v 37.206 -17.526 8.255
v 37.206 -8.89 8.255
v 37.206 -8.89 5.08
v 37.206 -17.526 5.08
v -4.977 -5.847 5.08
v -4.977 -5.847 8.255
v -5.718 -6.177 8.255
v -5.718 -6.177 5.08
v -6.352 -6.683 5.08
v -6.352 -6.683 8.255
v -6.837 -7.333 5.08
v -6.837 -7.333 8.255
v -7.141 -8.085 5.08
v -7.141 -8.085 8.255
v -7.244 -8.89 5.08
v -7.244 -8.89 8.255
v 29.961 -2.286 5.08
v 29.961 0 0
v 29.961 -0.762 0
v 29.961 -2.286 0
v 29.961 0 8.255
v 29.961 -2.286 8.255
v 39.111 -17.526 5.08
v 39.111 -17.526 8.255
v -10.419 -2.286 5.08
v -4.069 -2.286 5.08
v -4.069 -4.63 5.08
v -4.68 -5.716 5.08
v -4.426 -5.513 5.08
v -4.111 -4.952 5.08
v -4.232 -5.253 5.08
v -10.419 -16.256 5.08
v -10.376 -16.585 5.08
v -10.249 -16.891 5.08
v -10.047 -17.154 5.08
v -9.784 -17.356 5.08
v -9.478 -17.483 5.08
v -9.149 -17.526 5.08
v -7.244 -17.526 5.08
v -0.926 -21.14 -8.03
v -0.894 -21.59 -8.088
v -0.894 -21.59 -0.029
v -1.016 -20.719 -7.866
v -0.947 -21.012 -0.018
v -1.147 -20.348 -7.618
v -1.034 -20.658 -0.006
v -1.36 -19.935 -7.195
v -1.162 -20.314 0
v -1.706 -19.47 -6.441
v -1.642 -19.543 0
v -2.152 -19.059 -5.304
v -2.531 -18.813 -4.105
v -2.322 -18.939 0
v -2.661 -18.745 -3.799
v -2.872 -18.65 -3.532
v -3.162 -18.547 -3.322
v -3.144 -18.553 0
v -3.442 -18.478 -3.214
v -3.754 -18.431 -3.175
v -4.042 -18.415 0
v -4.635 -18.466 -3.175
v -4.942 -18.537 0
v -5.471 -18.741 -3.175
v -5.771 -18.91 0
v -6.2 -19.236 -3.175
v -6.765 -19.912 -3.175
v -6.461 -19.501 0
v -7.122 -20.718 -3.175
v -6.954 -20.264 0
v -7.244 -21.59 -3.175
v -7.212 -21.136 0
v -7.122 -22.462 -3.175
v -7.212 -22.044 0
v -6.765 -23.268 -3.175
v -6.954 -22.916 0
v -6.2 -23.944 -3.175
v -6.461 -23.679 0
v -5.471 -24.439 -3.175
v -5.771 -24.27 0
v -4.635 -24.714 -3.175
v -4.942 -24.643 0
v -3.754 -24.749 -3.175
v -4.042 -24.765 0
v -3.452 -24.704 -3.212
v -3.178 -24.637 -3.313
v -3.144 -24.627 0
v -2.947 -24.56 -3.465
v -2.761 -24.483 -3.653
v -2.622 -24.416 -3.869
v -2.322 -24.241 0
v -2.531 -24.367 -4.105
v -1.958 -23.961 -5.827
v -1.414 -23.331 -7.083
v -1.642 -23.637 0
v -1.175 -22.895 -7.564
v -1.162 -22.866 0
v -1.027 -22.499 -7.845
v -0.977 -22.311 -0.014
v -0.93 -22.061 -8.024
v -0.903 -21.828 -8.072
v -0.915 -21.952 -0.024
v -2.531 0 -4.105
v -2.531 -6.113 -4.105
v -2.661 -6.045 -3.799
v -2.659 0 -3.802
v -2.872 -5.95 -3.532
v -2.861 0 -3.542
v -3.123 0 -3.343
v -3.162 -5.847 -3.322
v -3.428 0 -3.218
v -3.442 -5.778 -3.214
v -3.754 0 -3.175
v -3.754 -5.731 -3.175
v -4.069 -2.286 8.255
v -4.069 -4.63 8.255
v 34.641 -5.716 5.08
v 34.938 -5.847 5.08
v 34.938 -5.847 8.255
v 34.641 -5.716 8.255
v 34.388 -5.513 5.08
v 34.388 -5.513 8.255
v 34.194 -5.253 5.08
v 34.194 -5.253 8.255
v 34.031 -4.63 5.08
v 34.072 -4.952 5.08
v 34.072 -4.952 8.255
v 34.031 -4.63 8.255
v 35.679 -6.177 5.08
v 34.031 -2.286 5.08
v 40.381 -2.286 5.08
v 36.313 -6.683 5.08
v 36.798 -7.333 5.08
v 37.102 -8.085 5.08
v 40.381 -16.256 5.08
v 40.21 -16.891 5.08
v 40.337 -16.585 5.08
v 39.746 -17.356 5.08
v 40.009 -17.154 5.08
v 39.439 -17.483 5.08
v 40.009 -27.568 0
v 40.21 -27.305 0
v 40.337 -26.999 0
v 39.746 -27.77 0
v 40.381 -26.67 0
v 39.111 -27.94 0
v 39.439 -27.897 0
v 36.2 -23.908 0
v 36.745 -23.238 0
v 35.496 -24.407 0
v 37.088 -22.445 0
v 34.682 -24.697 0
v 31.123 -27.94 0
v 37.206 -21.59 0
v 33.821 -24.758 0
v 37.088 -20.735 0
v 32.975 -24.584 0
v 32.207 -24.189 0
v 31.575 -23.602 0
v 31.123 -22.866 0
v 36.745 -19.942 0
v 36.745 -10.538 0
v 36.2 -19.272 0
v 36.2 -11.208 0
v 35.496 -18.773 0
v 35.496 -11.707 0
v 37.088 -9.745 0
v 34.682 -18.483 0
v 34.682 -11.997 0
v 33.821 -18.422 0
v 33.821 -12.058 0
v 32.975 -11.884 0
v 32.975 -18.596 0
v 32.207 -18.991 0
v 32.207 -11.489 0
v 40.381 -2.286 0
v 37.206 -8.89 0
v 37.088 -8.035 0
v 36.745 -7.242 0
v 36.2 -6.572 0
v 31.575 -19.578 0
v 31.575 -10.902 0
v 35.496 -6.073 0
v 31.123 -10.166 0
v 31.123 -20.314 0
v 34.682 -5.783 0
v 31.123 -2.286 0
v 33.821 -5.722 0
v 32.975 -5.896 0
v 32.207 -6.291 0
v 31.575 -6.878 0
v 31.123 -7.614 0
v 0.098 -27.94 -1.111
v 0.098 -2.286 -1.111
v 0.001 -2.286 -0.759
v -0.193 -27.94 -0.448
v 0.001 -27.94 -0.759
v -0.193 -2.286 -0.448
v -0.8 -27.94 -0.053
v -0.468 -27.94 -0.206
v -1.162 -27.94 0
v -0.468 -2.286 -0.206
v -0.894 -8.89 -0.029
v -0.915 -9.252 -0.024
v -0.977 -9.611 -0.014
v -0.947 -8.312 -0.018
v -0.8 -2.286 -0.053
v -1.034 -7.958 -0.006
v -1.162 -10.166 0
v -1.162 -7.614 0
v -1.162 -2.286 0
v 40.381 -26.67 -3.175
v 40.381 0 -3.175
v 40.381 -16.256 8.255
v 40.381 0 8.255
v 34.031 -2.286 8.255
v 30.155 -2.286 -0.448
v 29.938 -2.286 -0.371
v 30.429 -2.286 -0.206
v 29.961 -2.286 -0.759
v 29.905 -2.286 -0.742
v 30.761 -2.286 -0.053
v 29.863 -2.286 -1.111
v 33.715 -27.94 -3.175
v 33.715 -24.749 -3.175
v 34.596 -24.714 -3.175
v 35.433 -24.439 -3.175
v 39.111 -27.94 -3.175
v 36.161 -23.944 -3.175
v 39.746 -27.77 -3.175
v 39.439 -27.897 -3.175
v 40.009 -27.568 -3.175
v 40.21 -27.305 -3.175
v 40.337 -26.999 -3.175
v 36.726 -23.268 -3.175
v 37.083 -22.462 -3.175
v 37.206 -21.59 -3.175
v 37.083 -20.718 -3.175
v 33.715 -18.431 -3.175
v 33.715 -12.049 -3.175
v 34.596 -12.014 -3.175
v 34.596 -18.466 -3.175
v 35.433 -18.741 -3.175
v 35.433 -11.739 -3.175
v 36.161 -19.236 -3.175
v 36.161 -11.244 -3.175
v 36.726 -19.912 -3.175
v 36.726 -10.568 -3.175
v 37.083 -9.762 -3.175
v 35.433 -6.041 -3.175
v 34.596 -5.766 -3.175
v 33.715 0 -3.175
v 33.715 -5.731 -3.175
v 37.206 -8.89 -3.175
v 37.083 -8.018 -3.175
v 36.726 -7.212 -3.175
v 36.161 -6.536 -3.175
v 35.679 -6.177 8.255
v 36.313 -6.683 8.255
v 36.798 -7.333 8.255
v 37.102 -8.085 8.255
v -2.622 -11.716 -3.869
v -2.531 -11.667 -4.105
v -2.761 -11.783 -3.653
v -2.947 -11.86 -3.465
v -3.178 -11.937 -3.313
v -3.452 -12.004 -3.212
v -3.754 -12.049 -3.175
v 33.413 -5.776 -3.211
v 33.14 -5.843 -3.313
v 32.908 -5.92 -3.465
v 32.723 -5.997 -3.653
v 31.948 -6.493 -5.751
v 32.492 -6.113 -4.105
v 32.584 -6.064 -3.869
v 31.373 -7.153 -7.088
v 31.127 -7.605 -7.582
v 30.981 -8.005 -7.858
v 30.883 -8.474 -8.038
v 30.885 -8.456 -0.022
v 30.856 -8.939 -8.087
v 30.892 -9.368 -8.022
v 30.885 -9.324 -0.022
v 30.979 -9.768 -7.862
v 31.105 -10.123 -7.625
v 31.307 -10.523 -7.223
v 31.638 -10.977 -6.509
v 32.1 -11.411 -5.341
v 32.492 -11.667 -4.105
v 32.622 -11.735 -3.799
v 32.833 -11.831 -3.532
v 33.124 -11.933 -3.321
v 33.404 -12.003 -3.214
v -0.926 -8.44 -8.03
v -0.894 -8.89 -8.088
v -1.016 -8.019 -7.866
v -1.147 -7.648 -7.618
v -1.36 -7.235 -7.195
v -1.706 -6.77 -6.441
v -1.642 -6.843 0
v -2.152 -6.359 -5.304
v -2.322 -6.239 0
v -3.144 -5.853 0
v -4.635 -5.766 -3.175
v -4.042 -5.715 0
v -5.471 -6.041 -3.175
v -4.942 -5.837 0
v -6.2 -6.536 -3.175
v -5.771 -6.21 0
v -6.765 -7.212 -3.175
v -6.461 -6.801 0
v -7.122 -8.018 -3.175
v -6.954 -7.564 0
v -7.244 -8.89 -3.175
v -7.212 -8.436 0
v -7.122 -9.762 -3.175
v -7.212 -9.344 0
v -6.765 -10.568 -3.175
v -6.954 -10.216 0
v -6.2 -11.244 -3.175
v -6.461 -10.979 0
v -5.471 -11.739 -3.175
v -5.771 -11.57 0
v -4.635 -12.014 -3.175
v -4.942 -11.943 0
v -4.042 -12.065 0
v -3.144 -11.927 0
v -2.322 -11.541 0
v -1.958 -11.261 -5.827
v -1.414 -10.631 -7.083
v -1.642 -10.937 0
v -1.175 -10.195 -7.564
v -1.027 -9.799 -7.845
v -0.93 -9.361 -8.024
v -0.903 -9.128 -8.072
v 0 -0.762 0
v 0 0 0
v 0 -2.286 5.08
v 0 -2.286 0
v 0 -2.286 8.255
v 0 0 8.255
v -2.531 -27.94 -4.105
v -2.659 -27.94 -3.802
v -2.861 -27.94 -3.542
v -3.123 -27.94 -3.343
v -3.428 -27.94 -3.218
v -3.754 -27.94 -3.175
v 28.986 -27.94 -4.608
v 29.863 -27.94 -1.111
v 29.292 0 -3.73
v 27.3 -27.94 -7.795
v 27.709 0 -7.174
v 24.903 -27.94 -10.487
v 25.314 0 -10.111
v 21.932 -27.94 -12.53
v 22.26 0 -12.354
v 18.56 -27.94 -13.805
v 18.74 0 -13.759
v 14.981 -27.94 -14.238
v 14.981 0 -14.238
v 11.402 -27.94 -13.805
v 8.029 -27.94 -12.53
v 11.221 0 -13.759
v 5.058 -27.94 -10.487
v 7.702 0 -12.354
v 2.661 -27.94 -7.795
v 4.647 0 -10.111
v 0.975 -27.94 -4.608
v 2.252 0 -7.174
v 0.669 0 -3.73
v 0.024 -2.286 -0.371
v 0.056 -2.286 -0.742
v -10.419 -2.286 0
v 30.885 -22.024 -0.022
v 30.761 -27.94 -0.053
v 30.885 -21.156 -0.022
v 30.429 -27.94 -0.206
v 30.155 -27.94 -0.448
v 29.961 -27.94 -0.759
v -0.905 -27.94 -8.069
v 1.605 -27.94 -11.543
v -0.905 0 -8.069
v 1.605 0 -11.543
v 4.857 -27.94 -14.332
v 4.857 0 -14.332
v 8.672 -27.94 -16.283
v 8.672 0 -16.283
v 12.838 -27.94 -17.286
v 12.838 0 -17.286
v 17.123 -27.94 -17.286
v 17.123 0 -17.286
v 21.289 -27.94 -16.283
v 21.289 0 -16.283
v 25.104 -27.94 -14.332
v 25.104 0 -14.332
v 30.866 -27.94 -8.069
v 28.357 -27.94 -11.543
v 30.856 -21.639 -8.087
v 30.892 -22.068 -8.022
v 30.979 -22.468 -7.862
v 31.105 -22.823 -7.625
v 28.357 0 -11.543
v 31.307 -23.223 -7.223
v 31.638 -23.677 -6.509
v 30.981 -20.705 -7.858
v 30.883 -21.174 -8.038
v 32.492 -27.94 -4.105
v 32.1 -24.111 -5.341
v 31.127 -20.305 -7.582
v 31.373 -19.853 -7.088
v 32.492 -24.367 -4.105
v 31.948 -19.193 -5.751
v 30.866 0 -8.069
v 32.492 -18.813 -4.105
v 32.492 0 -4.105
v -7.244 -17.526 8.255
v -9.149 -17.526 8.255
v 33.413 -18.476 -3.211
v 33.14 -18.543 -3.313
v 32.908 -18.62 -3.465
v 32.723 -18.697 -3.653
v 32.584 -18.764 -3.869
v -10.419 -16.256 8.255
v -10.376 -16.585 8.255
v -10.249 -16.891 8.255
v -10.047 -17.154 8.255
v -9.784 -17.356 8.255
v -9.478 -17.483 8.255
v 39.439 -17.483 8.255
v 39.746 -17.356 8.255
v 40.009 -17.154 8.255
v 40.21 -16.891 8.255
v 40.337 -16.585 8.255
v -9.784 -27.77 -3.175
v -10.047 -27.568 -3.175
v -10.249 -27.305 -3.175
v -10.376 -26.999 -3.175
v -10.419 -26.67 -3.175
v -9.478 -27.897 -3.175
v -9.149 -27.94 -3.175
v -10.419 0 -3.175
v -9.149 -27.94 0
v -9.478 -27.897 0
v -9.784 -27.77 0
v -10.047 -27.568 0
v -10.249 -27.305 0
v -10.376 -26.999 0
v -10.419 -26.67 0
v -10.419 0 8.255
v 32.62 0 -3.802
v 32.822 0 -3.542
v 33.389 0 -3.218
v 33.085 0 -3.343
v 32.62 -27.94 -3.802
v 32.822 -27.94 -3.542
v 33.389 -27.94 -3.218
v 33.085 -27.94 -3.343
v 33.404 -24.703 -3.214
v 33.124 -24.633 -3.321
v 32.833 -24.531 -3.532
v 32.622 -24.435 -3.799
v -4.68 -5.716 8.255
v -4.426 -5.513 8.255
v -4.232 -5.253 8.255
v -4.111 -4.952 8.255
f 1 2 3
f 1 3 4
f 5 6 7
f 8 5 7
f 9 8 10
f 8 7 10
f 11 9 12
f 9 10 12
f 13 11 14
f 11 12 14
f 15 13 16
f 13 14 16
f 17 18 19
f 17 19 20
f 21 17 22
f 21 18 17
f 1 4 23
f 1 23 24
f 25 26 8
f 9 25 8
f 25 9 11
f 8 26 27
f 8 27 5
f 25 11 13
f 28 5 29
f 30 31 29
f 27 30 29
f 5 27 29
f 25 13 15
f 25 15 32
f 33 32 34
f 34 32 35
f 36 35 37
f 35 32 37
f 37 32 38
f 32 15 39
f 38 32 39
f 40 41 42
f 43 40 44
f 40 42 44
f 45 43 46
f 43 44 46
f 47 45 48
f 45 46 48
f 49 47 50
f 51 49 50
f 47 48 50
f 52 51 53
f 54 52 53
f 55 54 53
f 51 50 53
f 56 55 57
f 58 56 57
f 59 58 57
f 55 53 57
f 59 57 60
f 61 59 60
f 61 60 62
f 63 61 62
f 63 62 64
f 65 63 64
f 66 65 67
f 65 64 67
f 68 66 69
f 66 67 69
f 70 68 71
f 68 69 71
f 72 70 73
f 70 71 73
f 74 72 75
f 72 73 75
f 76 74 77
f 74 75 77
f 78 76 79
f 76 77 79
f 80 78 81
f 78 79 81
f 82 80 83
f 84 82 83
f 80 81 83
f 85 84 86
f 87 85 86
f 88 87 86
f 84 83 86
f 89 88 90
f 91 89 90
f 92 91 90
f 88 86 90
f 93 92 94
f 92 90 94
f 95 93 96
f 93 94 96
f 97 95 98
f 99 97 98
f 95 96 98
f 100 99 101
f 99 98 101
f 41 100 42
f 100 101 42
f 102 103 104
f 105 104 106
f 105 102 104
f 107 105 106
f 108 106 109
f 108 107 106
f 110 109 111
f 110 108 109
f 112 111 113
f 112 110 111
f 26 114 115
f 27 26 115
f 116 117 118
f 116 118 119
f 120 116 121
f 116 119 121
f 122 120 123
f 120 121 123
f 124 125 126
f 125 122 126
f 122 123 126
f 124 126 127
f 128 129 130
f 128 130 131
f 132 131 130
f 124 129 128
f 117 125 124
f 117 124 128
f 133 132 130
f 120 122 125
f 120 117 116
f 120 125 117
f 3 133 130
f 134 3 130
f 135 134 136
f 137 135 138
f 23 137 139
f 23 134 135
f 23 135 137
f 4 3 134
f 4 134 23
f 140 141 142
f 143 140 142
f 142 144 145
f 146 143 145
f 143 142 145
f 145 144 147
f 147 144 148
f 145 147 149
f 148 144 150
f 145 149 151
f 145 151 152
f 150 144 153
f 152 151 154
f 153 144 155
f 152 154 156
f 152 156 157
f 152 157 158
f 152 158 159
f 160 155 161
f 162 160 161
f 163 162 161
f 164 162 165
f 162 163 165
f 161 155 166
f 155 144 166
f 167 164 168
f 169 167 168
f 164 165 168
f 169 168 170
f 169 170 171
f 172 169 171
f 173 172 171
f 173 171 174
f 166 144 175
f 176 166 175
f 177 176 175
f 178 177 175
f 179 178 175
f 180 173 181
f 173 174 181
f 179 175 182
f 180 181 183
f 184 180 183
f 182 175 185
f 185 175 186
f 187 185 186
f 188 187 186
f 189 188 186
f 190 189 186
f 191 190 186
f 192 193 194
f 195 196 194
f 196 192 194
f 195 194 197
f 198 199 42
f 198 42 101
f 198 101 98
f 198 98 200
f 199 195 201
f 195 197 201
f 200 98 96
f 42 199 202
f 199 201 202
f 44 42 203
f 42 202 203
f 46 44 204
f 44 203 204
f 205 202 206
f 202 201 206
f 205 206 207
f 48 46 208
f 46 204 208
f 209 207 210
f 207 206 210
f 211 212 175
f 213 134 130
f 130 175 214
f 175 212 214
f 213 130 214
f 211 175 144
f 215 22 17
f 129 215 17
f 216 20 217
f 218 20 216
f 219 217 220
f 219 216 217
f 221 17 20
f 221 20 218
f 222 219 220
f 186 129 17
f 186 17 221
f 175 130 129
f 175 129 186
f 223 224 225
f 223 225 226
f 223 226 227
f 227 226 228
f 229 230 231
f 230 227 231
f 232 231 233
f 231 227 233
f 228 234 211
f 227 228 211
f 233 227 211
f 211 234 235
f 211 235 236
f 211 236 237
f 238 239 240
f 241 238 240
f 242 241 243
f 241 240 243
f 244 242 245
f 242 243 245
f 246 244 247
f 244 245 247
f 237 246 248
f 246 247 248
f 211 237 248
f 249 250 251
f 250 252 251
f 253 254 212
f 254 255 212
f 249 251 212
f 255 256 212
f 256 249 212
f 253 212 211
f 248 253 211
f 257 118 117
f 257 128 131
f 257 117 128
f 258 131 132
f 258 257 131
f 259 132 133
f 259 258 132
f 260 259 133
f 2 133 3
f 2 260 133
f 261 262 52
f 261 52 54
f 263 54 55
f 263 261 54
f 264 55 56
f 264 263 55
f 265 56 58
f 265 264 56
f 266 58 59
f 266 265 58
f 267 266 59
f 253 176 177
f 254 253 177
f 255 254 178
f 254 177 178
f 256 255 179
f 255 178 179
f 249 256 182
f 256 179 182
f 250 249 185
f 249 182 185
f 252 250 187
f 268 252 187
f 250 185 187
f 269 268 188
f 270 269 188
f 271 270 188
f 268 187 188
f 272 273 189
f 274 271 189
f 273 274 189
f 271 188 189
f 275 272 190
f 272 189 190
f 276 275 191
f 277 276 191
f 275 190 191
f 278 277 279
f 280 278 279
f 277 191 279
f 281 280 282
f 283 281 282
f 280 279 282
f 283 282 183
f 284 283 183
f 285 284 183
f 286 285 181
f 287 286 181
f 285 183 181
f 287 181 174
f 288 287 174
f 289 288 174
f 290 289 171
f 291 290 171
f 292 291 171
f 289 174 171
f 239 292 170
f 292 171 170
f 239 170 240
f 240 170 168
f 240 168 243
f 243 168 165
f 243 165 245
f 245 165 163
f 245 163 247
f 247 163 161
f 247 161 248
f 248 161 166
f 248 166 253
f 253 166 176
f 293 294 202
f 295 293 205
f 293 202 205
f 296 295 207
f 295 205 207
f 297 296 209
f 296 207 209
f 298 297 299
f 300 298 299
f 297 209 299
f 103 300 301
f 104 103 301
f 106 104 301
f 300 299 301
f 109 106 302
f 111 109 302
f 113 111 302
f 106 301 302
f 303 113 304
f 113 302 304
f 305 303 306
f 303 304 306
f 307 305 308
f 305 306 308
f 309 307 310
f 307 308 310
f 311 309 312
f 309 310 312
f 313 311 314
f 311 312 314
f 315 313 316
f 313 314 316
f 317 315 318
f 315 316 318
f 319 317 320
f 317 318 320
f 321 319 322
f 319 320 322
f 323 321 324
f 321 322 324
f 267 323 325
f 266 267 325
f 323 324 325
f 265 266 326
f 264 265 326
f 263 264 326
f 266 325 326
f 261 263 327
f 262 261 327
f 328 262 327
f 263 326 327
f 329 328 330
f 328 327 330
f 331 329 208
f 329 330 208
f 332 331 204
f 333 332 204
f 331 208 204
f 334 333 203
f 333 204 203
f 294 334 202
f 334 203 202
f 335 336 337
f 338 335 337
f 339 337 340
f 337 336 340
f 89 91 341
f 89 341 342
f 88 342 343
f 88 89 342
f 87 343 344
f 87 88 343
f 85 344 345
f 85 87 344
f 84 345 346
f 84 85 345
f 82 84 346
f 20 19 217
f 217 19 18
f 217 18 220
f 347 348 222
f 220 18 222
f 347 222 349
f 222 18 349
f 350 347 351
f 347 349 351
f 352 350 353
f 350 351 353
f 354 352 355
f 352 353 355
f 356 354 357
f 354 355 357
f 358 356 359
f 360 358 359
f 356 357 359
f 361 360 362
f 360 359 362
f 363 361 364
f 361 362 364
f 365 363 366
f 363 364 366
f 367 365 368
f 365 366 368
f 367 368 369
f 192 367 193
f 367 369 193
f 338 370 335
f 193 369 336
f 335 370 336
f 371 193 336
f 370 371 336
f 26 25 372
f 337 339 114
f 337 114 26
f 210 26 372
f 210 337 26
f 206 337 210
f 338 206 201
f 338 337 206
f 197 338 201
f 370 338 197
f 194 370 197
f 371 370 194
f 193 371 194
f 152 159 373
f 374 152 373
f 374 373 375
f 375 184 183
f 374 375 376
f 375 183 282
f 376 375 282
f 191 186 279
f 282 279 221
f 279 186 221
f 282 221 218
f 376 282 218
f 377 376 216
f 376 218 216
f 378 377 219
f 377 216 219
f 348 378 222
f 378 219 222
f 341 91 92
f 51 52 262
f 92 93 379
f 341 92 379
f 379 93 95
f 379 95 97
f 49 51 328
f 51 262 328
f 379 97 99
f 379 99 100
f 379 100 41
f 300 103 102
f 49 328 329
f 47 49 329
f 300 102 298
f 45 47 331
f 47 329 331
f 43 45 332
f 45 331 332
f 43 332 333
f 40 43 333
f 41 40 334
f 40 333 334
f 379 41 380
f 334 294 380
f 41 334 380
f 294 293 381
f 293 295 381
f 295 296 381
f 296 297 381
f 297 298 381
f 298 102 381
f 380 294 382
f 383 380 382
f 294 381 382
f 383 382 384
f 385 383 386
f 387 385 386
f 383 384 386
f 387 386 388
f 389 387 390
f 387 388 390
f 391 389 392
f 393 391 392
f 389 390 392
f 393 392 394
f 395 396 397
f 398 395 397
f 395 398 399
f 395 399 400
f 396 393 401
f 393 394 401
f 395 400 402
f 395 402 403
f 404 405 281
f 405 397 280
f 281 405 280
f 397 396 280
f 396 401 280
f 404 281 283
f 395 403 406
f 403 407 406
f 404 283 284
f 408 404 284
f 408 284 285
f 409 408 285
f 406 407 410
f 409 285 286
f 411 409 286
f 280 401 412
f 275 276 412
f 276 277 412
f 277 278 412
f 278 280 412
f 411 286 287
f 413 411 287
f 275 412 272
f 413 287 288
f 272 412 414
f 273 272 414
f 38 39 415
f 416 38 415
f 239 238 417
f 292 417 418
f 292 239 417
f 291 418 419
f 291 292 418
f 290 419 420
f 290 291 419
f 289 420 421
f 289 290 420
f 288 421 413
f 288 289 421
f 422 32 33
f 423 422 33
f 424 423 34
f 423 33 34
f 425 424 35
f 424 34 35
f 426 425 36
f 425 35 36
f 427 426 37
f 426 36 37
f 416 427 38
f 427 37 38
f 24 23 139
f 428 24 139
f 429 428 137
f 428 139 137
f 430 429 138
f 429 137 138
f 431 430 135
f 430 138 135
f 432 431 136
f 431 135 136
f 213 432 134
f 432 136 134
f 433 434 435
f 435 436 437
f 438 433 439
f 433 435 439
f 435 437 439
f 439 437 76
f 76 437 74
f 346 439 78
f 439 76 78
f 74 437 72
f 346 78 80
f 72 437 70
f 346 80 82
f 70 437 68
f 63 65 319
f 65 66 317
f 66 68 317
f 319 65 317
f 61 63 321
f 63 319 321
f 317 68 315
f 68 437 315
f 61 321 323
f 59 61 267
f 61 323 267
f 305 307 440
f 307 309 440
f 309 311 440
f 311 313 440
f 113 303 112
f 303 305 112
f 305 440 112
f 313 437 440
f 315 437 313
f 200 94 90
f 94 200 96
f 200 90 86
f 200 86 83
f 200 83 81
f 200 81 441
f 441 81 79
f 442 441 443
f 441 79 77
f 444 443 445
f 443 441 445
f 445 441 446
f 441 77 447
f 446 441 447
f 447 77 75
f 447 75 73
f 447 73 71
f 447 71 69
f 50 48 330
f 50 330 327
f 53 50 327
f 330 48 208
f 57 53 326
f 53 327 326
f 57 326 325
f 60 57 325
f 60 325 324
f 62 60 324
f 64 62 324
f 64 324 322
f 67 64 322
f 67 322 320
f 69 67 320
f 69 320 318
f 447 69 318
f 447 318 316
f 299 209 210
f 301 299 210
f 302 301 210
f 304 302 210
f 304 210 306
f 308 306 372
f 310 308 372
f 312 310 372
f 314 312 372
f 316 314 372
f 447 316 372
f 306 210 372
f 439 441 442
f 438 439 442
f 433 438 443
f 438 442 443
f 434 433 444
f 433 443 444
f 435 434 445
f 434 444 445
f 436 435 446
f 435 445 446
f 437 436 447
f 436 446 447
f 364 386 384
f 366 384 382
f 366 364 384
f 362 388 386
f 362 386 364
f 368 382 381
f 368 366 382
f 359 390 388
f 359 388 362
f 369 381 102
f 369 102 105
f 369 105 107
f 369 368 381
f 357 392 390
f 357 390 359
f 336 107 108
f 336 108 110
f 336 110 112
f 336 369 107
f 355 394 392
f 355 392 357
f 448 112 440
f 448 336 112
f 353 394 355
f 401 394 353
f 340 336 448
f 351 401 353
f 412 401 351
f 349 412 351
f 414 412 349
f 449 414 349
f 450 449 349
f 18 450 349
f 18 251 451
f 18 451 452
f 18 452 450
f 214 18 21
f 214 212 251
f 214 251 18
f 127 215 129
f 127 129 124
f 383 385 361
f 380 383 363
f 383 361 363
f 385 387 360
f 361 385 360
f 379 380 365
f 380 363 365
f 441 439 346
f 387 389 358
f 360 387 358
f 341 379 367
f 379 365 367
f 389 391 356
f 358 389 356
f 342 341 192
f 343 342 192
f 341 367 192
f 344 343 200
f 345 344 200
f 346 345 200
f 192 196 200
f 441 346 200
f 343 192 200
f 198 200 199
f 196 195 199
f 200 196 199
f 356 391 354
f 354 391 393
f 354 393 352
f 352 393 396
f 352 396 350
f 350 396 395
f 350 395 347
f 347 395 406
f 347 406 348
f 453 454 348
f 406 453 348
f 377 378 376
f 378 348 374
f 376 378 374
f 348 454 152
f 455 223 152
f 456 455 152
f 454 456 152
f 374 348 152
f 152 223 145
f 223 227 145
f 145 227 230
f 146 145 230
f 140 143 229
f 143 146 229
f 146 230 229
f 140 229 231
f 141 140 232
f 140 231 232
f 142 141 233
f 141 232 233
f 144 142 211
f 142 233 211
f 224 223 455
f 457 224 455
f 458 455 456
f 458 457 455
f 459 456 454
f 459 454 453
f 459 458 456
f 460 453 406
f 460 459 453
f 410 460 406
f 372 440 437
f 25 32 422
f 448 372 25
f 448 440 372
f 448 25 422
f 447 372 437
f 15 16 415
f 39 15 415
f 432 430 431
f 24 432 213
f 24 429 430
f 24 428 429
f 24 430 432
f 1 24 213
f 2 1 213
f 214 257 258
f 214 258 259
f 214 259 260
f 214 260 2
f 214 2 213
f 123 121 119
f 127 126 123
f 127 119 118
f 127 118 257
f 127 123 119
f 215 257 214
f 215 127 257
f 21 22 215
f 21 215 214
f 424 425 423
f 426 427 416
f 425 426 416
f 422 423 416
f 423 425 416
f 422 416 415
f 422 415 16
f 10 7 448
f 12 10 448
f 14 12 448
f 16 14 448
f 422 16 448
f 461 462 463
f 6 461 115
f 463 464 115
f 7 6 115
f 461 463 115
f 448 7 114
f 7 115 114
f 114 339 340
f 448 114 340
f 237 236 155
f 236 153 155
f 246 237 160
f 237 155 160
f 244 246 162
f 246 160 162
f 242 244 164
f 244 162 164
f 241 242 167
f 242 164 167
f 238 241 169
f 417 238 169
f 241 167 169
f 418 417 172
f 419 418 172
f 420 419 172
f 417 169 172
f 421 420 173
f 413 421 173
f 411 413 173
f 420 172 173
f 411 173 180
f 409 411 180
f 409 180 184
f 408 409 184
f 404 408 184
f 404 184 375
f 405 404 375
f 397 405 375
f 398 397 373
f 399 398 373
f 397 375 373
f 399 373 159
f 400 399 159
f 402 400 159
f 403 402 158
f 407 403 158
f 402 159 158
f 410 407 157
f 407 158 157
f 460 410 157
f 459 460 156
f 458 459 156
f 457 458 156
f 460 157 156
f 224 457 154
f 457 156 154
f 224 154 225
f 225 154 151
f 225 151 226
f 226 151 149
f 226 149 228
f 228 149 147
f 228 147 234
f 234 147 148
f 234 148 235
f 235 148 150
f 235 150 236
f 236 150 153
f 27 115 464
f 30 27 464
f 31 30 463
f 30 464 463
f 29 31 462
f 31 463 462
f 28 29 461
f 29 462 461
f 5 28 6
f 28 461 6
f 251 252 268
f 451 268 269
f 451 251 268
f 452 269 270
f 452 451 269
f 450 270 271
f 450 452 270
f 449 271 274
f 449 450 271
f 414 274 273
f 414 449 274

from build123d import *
from OCP.BRepAlgoAPI import BRepAlgoAPI_Cut
from OCP.TopTools import TopTools_ListOfShape

# Parameters (mm, degrees)
BOSS_EXTRUDE1_DEPTH = 27.94
SKETCH3_R           = 3.175
CUT_EXTRUDE1_DEPTH  = 53.100399864
BOSS_EXTRUDE2_START = -10.419367
BOSS_EXTRUDE2_DEPTH = 10.419367
CUT_EXTRUDE2_DEPTH  = 6.35
FILLET1_R           = 1.27


with BuildPart() as part:
    # Sketch2 → Boss-Extrude1 (new body)
    with BuildSketch(Plane(origin=(0, 0, 0), x_dir=(1, 0, 0), z_dir=(0, 1, 0))):
        with BuildLine():
            Line((0, 0), (-10.419367303, 0))
            Line((-10.419367303, 0), (-10.419367303, 3.175))
            Line((-10.419367303, 3.175), (-2.762835284, 3.175))
            ThreePointArc((-2.762835284, 3.175), (14.980632697, 17.413), (32.724100678, 3.175))
            Line((32.724100678, 3.175), (40.380632697, 3.175))
            Line((40.380632697, 3.175), (40.380632697, 0))
            Line((40.380632697, 0), (29.961265394, 0))
            ThreePointArc((29.961265394, 0), (14.980632697, 14.238), (0, 0))
        make_face()
    extrude(amount=-BOSS_EXTRUDE1_DEPTH)

    # Sketch3 → Cut-Extrude1 (cut, through all)
    with BuildSketch(Plane.XY):
        with Locations((-4.069367303, -8.89)):
            Circle(SKETCH3_R)
        with Locations((34.030632697, -8.89)):
            Circle(SKETCH3_R)
        with Locations((-4.069367303, -21.59)):
            Circle(SKETCH3_R)
        with Locations((34.030632697, -21.59)):
            Circle(SKETCH3_R)
    extrude(amount=-CUT_EXTRUDE1_DEPTH, mode=Mode.SUBTRACT)

    # Sketch4 → Boss-Extrude2 (add)
    with BuildSketch(Plane(origin=(40.380632697, 0, 0), x_dir=(0, 0, -1), z_dir=(1, 0, 0)).offset(BOSS_EXTRUDE2_START)):
        Polygon((-5.08, -17.526), (-8.255, -17.526), (-8.255, 0), (0, 0), (0, -2.286), (-5.08, -2.286), align=None)
    boss_extrude2 = extrude(amount=BOSS_EXTRUDE2_DEPTH)


with BuildPart() as cut_extrude2_tool:
    # Sketch5 → Cut-Extrude2 (new body)
    with BuildSketch(Plane.XY.offset(8.255)):
        with BuildLine():
            Line((37.205632697, -8.89), (37.205632697, -17.526))
            Line((37.205632697, -17.526), (29.961265394, -17.526))
            Line((29.961265394, -17.526), (29.961265394, -2.286))
            Line((29.961265394, -2.286), (34.030632697, -2.286))
            Line((34.030632697, -2.286), (34.030632697, -5.715))
            ThreePointArc((34.030632697, -5.715), (36.275696727, -6.64493597), (37.205632697, -8.89))
        make_face()
    cut_extrude2 = extrude(amount=-CUT_EXTRUDE2_DEPTH)


with BuildPart() as part_1:
    add(part.part)

    # Cut-Extrude2: cut by cut_extrude2_tool, with a tolerance
    cut_extrude2_stock = TopTools_ListOfShape()
    cut_extrude2_stock.Append(part_1.part.wrapped)
    cut_extrude2_tools = TopTools_ListOfShape()
    cut_extrude2_tools.Append(cut_extrude2_tool.part.wrapped)
    cut_extrude2_cut = BRepAlgoAPI_Cut()
    cut_extrude2_cut.SetArguments(cut_extrude2_stock)
    cut_extrude2_cut.SetTools(cut_extrude2_tools)
    cut_extrude2_cut.SetFuzzyValue(0.00001)
    cut_extrude2_cut.Build()
    add(Compound.cast(cut_extrude2_cut.Shape()).solids(), mode=Mode.REPLACE)

    # Mirror1: Boss-Extrude2, Cut-Extrude2 across plane
    add(boss_extrude2.mirror(Plane.ZY.offset(-14.980632697)))
    add(cut_extrude2.mirror(Plane.ZY.offset(-14.980632697)), mode=Mode.SUBTRACT)

    # Fillet1
    # the kernel refuses this fillet: 1.27 mm, written as the material it adds along each edge
    with BuildSketch(Plane(origin=(32.724100678, 0, -3.175), x_dir=(1, 0, 0), z_dir=(0, -1, 0))) as fillet1_piece_1_section:
        with BuildLine():
            CenterArc((0.991397271, -1.27), FILLET1_R, 90, 74.467738735)
            ThreePointArc((-0.232222111, -0.929918231), (-0.109979978, -0.466490187), (0, 0))
            Line((0, 0), (0.991397271, 0))
        make_face()
    fillet1_piece_1 = extrude(amount=8.474776002, mode=Mode.PRIVATE)
    fillet1_piece_1 = fillet1_piece_1 - Plane(origin=(34.030632697, -8.89, -3.175), x_dir=(1, 0, 0), z_dir=(0, 0, 1)) * Cylinder(3.175, 21, mode=Mode.PRIVATE)
    add(fillet1_piece_1)
    with BuildSketch(Plane(origin=(32.724100678, -22.005223998, -3.175), x_dir=(1, 0, 0), z_dir=(0, -1, 0))) as fillet1_piece_2_section:
        with BuildLine():
            CenterArc((0.991397271, -1.27), FILLET1_R, 90, 74.467738735)
            ThreePointArc((-0.232222111, -0.929918231), (-0.109979978, -0.466490187), (0, 0))
            Line((0, 0), (0.991397271, 0))
        make_face()
    fillet1_piece_2 = extrude(amount=5.934776002, mode=Mode.PRIVATE)
    fillet1_piece_2 = fillet1_piece_2 - Plane(origin=(34.030632697, -21.59, -3.175), x_dir=(1, 0, 0), z_dir=(0, 0, 1)) * Cylinder(3.175, 16, mode=Mode.PRIVATE)
    add(fillet1_piece_2)
    with BuildSketch(Plane(origin=(32.724100678, -9.305223998, -3.175), x_dir=(1, 0, 0), z_dir=(0, -1, 0))) as fillet1_piece_3_section:
        with BuildLine():
            CenterArc((0.991397271, -1.27), FILLET1_R, 90, 74.467738735)
            ThreePointArc((-0.232222111, -0.929918231), (-0.109979978, -0.466490187), (0, 0))
            Line((0, 0), (0.991397271, 0))
        make_face()
    fillet1_piece_3 = extrude(amount=11.869552004, mode=Mode.PRIVATE)
    fillet1_piece_3 = fillet1_piece_3 - Plane(origin=(34.030632697, -21.59, -3.175), x_dir=(1, 0, 0), z_dir=(0, 0, 1)) * Cylinder(3.175, 28, mode=Mode.PRIVATE)
    fillet1_piece_3 = fillet1_piece_3 - Plane(origin=(34.030632697, -8.89, -3.175), x_dir=(1, 0, 0), z_dir=(0, 0, 1)) * Cylinder(3.175, 28, mode=Mode.PRIVATE)
    add(fillet1_piece_3)
    with BuildSketch(Plane(origin=(-2.762835284, 0, -3.175), x_dir=(0.24228281636804117, 0, -0.9702056673163532), z_dir=(0, -1, 0))) as fillet1_piece_4_section:
        with BuildLine():
            CenterArc((0.991962675, -1.269558427), FILLET1_R, 91.510947972, 74.467738735)
            Line((-0.240198523, -0.96185925), (0, 0))
            ThreePointArc((0, 0), (0.479237682, -0.006319359), (0.958475365, 0))
        make_face()
    fillet1_piece_4 = extrude(amount=8.474776002, mode=Mode.PRIVATE)
    fillet1_piece_4 = fillet1_piece_4 - Plane(origin=(-4.069367303, -8.89, -3.175), x_dir=(1, 0, 0), z_dir=(0, 0, 1)) * Cylinder(3.175, 21, mode=Mode.PRIVATE)
    add(fillet1_piece_4)
    with BuildSketch(Plane(origin=(-2.762835284, -22.005223998, -3.175), x_dir=(0.24228281636804117, 0, -0.9702056673163532), z_dir=(0, -1, 0))) as fillet1_piece_5_section:
        with BuildLine():
            CenterArc((0.991962675, -1.269558427), FILLET1_R, 91.510947972, 74.467738735)
            Line((-0.240198523, -0.96185925), (0, 0))
            ThreePointArc((0, 0), (0.479237682, -0.006319359), (0.958475365, 0))
        make_face()
    fillet1_piece_5 = extrude(amount=5.934776002, mode=Mode.PRIVATE)
    fillet1_piece_5 = fillet1_piece_5 - Plane(origin=(-4.069367303, -21.59, -3.175), x_dir=(1, 0, 0), z_dir=(0, 0, 1)) * Cylinder(3.175, 16, mode=Mode.PRIVATE)
    add(fillet1_piece_5)
    with BuildSketch(Plane(origin=(-2.762835284, -9.305223998, -3.175), x_dir=(0.24228281636804117, 0, -0.9702056673163532), z_dir=(0, -1, 0))) as fillet1_piece_6_section:
        with BuildLine():
            CenterArc((0.991962675, -1.269558427), FILLET1_R, 91.510947972, 74.467738735)
            Line((-0.240198523, -0.96185925), (0, 0))
            ThreePointArc((0, 0), (0.479237682, -0.006319359), (0.958475365, 0))
        make_face()
    fillet1_piece_6 = extrude(amount=11.869552004, mode=Mode.PRIVATE)
    fillet1_piece_6 = fillet1_piece_6 - Plane(origin=(-4.069367303, -21.59, -3.175), x_dir=(1, 0, 0), z_dir=(0, 0, 1)) * Cylinder(3.175, 28, mode=Mode.PRIVATE)
    fillet1_piece_6 = fillet1_piece_6 - Plane(origin=(-4.069367303, -8.89, -3.175), x_dir=(1, 0, 0), z_dir=(0, 0, 1)) * Cylinder(3.175, 28, mode=Mode.PRIVATE)
    add(fillet1_piece_6)
    # the kernel refuses this fillet: 1.27 mm, written as the material it takes off along each edge
    with BuildSketch(Plane(origin=(29.961265394, 2.904944682, 0), x_dir=(-0.08790703364756058, 0, -0.9961286831706467), z_dir=(0, -1, 0))) as fillet1_2_piece_1_section:
        with BuildLine():
            CenterArc((1.1629374, 1.269121421), FILLET1_R, 185.043211655, 82.825455624)
            Line((-0.102146028, 1.157479488), (0, 0))
            ThreePointArc((0, 0), (0.557852926, 0.010376919), (1.115705852, 0))
        make_face()
    fillet1_2_piece_1 = extrude(amount=33.749889363, mode=Mode.PRIVATE)
    fillet1_2_piece_1 = split(fillet1_2_piece_1, bisect_by=Plane(origin=(29.961265394, -2.286, 0), z_dir=(0, -1, 0)), keep=Keep.TOP, mode=Mode.PRIVATE)
    add(fillet1_2_piece_1, mode=Mode.SUBTRACT)
    with BuildSketch(Plane(origin=(0, 2.904944682, 0), x_dir=(-1, 0, 0), z_dir=(0, -1, 0))) as fillet1_2_piece_2_section:
        with BuildLine():
            CenterArc((1.161977873, 1.27), FILLET1_R, 187.174544376, 82.825455624)
            ThreePointArc((-0.098078392, 1.111386601), (-0.038702449, 0.556605505), (0, 0))
            Line((0, 0), (1.161977873, 0))
        make_face()
    fillet1_2_piece_2 = extrude(amount=33.749889363, mode=Mode.PRIVATE)
    fillet1_2_piece_2 = split(fillet1_2_piece_2, bisect_by=Plane(origin=(0, -2.286, 0), z_dir=(0, -1, 0)), keep=Keep.TOP, mode=Mode.PRIVATE)
    add(fillet1_2_piece_2, mode=Mode.SUBTRACT)
    with BuildSketch(Plane(origin=(-10.419367303, -17.526, 1.905), x_dir=(0, 1, 0), z_dir=(0, 0, 1)), Plane(origin=(40.380632697, -27.94, -6.35), x_dir=(-1, 0, 0), z_dir=(0, 0, 1)), Plane(origin=(40.380632697, -17.526, 1.905), x_dir=(-1, 0, 0), z_dir=(0, 0, 1))) as fillet1_2_piece_3:
        with BuildLine():
            CenterArc((FILLET1_R, -FILLET1_R), FILLET1_R, 90, 90)
            Line((0, -FILLET1_R), (0, 0))
            Line((0, 0), (FILLET1_R, 0))
        make_face()
    extrude(amount=9.525, mode=Mode.SUBTRACT)
    with BuildSketch(Plane(origin=(-10.419367303, -27.94, 3.175), x_dir=(0, 1, 0), z_dir=(0, 0, -1))) as fillet1_2_piece_4:
        with BuildLine():
            CenterArc((FILLET1_R, FILLET1_R), FILLET1_R, 180, 90)
            Line((0, FILLET1_R), (0, 0))
            Line((0, 0), (FILLET1_R, 0))
        make_face()
    extrude(amount=9.525, mode=Mode.SUBTRACT)
    with BuildSketch(Plane(origin=(34.030632697, -5.715, 10.966773743), x_dir=(0, 1, 0), z_dir=(0, 0, -1))) as fillet1_2_piece_5:
        with BuildLine():
            CenterArc((1.084709497, 1.27), FILLET1_R, 196.601549599, 73.398450401)
            ThreePointArc((-0.132350359, 0.907142857), (-0.033261818, 0.458373423), (0, 0))
            Line((0, 0), (1.084709497, 0))
        make_face()
    extrude(amount=8.598547486, mode=Mode.SUBTRACT)
    with BuildSketch(Plane(origin=(-4.069367303, -5.715, 10.966773743), x_dir=(0, 1, 0), z_dir=(0, 0, -1))) as fillet1_2_piece_6:
        with BuildLine():
            CenterArc((1.084709497, -1.27), FILLET1_R, 90, 73.398450401)
            ThreePointArc((-0.132350359, -0.907142857), (-0.033261818, -0.458373423), (0, 0))
            Line((0, 0), (1.084709497, 0))
        make_face()
    extrude(amount=8.598547486, mode=Mode.SUBTRACT)


solid = part_1.part
